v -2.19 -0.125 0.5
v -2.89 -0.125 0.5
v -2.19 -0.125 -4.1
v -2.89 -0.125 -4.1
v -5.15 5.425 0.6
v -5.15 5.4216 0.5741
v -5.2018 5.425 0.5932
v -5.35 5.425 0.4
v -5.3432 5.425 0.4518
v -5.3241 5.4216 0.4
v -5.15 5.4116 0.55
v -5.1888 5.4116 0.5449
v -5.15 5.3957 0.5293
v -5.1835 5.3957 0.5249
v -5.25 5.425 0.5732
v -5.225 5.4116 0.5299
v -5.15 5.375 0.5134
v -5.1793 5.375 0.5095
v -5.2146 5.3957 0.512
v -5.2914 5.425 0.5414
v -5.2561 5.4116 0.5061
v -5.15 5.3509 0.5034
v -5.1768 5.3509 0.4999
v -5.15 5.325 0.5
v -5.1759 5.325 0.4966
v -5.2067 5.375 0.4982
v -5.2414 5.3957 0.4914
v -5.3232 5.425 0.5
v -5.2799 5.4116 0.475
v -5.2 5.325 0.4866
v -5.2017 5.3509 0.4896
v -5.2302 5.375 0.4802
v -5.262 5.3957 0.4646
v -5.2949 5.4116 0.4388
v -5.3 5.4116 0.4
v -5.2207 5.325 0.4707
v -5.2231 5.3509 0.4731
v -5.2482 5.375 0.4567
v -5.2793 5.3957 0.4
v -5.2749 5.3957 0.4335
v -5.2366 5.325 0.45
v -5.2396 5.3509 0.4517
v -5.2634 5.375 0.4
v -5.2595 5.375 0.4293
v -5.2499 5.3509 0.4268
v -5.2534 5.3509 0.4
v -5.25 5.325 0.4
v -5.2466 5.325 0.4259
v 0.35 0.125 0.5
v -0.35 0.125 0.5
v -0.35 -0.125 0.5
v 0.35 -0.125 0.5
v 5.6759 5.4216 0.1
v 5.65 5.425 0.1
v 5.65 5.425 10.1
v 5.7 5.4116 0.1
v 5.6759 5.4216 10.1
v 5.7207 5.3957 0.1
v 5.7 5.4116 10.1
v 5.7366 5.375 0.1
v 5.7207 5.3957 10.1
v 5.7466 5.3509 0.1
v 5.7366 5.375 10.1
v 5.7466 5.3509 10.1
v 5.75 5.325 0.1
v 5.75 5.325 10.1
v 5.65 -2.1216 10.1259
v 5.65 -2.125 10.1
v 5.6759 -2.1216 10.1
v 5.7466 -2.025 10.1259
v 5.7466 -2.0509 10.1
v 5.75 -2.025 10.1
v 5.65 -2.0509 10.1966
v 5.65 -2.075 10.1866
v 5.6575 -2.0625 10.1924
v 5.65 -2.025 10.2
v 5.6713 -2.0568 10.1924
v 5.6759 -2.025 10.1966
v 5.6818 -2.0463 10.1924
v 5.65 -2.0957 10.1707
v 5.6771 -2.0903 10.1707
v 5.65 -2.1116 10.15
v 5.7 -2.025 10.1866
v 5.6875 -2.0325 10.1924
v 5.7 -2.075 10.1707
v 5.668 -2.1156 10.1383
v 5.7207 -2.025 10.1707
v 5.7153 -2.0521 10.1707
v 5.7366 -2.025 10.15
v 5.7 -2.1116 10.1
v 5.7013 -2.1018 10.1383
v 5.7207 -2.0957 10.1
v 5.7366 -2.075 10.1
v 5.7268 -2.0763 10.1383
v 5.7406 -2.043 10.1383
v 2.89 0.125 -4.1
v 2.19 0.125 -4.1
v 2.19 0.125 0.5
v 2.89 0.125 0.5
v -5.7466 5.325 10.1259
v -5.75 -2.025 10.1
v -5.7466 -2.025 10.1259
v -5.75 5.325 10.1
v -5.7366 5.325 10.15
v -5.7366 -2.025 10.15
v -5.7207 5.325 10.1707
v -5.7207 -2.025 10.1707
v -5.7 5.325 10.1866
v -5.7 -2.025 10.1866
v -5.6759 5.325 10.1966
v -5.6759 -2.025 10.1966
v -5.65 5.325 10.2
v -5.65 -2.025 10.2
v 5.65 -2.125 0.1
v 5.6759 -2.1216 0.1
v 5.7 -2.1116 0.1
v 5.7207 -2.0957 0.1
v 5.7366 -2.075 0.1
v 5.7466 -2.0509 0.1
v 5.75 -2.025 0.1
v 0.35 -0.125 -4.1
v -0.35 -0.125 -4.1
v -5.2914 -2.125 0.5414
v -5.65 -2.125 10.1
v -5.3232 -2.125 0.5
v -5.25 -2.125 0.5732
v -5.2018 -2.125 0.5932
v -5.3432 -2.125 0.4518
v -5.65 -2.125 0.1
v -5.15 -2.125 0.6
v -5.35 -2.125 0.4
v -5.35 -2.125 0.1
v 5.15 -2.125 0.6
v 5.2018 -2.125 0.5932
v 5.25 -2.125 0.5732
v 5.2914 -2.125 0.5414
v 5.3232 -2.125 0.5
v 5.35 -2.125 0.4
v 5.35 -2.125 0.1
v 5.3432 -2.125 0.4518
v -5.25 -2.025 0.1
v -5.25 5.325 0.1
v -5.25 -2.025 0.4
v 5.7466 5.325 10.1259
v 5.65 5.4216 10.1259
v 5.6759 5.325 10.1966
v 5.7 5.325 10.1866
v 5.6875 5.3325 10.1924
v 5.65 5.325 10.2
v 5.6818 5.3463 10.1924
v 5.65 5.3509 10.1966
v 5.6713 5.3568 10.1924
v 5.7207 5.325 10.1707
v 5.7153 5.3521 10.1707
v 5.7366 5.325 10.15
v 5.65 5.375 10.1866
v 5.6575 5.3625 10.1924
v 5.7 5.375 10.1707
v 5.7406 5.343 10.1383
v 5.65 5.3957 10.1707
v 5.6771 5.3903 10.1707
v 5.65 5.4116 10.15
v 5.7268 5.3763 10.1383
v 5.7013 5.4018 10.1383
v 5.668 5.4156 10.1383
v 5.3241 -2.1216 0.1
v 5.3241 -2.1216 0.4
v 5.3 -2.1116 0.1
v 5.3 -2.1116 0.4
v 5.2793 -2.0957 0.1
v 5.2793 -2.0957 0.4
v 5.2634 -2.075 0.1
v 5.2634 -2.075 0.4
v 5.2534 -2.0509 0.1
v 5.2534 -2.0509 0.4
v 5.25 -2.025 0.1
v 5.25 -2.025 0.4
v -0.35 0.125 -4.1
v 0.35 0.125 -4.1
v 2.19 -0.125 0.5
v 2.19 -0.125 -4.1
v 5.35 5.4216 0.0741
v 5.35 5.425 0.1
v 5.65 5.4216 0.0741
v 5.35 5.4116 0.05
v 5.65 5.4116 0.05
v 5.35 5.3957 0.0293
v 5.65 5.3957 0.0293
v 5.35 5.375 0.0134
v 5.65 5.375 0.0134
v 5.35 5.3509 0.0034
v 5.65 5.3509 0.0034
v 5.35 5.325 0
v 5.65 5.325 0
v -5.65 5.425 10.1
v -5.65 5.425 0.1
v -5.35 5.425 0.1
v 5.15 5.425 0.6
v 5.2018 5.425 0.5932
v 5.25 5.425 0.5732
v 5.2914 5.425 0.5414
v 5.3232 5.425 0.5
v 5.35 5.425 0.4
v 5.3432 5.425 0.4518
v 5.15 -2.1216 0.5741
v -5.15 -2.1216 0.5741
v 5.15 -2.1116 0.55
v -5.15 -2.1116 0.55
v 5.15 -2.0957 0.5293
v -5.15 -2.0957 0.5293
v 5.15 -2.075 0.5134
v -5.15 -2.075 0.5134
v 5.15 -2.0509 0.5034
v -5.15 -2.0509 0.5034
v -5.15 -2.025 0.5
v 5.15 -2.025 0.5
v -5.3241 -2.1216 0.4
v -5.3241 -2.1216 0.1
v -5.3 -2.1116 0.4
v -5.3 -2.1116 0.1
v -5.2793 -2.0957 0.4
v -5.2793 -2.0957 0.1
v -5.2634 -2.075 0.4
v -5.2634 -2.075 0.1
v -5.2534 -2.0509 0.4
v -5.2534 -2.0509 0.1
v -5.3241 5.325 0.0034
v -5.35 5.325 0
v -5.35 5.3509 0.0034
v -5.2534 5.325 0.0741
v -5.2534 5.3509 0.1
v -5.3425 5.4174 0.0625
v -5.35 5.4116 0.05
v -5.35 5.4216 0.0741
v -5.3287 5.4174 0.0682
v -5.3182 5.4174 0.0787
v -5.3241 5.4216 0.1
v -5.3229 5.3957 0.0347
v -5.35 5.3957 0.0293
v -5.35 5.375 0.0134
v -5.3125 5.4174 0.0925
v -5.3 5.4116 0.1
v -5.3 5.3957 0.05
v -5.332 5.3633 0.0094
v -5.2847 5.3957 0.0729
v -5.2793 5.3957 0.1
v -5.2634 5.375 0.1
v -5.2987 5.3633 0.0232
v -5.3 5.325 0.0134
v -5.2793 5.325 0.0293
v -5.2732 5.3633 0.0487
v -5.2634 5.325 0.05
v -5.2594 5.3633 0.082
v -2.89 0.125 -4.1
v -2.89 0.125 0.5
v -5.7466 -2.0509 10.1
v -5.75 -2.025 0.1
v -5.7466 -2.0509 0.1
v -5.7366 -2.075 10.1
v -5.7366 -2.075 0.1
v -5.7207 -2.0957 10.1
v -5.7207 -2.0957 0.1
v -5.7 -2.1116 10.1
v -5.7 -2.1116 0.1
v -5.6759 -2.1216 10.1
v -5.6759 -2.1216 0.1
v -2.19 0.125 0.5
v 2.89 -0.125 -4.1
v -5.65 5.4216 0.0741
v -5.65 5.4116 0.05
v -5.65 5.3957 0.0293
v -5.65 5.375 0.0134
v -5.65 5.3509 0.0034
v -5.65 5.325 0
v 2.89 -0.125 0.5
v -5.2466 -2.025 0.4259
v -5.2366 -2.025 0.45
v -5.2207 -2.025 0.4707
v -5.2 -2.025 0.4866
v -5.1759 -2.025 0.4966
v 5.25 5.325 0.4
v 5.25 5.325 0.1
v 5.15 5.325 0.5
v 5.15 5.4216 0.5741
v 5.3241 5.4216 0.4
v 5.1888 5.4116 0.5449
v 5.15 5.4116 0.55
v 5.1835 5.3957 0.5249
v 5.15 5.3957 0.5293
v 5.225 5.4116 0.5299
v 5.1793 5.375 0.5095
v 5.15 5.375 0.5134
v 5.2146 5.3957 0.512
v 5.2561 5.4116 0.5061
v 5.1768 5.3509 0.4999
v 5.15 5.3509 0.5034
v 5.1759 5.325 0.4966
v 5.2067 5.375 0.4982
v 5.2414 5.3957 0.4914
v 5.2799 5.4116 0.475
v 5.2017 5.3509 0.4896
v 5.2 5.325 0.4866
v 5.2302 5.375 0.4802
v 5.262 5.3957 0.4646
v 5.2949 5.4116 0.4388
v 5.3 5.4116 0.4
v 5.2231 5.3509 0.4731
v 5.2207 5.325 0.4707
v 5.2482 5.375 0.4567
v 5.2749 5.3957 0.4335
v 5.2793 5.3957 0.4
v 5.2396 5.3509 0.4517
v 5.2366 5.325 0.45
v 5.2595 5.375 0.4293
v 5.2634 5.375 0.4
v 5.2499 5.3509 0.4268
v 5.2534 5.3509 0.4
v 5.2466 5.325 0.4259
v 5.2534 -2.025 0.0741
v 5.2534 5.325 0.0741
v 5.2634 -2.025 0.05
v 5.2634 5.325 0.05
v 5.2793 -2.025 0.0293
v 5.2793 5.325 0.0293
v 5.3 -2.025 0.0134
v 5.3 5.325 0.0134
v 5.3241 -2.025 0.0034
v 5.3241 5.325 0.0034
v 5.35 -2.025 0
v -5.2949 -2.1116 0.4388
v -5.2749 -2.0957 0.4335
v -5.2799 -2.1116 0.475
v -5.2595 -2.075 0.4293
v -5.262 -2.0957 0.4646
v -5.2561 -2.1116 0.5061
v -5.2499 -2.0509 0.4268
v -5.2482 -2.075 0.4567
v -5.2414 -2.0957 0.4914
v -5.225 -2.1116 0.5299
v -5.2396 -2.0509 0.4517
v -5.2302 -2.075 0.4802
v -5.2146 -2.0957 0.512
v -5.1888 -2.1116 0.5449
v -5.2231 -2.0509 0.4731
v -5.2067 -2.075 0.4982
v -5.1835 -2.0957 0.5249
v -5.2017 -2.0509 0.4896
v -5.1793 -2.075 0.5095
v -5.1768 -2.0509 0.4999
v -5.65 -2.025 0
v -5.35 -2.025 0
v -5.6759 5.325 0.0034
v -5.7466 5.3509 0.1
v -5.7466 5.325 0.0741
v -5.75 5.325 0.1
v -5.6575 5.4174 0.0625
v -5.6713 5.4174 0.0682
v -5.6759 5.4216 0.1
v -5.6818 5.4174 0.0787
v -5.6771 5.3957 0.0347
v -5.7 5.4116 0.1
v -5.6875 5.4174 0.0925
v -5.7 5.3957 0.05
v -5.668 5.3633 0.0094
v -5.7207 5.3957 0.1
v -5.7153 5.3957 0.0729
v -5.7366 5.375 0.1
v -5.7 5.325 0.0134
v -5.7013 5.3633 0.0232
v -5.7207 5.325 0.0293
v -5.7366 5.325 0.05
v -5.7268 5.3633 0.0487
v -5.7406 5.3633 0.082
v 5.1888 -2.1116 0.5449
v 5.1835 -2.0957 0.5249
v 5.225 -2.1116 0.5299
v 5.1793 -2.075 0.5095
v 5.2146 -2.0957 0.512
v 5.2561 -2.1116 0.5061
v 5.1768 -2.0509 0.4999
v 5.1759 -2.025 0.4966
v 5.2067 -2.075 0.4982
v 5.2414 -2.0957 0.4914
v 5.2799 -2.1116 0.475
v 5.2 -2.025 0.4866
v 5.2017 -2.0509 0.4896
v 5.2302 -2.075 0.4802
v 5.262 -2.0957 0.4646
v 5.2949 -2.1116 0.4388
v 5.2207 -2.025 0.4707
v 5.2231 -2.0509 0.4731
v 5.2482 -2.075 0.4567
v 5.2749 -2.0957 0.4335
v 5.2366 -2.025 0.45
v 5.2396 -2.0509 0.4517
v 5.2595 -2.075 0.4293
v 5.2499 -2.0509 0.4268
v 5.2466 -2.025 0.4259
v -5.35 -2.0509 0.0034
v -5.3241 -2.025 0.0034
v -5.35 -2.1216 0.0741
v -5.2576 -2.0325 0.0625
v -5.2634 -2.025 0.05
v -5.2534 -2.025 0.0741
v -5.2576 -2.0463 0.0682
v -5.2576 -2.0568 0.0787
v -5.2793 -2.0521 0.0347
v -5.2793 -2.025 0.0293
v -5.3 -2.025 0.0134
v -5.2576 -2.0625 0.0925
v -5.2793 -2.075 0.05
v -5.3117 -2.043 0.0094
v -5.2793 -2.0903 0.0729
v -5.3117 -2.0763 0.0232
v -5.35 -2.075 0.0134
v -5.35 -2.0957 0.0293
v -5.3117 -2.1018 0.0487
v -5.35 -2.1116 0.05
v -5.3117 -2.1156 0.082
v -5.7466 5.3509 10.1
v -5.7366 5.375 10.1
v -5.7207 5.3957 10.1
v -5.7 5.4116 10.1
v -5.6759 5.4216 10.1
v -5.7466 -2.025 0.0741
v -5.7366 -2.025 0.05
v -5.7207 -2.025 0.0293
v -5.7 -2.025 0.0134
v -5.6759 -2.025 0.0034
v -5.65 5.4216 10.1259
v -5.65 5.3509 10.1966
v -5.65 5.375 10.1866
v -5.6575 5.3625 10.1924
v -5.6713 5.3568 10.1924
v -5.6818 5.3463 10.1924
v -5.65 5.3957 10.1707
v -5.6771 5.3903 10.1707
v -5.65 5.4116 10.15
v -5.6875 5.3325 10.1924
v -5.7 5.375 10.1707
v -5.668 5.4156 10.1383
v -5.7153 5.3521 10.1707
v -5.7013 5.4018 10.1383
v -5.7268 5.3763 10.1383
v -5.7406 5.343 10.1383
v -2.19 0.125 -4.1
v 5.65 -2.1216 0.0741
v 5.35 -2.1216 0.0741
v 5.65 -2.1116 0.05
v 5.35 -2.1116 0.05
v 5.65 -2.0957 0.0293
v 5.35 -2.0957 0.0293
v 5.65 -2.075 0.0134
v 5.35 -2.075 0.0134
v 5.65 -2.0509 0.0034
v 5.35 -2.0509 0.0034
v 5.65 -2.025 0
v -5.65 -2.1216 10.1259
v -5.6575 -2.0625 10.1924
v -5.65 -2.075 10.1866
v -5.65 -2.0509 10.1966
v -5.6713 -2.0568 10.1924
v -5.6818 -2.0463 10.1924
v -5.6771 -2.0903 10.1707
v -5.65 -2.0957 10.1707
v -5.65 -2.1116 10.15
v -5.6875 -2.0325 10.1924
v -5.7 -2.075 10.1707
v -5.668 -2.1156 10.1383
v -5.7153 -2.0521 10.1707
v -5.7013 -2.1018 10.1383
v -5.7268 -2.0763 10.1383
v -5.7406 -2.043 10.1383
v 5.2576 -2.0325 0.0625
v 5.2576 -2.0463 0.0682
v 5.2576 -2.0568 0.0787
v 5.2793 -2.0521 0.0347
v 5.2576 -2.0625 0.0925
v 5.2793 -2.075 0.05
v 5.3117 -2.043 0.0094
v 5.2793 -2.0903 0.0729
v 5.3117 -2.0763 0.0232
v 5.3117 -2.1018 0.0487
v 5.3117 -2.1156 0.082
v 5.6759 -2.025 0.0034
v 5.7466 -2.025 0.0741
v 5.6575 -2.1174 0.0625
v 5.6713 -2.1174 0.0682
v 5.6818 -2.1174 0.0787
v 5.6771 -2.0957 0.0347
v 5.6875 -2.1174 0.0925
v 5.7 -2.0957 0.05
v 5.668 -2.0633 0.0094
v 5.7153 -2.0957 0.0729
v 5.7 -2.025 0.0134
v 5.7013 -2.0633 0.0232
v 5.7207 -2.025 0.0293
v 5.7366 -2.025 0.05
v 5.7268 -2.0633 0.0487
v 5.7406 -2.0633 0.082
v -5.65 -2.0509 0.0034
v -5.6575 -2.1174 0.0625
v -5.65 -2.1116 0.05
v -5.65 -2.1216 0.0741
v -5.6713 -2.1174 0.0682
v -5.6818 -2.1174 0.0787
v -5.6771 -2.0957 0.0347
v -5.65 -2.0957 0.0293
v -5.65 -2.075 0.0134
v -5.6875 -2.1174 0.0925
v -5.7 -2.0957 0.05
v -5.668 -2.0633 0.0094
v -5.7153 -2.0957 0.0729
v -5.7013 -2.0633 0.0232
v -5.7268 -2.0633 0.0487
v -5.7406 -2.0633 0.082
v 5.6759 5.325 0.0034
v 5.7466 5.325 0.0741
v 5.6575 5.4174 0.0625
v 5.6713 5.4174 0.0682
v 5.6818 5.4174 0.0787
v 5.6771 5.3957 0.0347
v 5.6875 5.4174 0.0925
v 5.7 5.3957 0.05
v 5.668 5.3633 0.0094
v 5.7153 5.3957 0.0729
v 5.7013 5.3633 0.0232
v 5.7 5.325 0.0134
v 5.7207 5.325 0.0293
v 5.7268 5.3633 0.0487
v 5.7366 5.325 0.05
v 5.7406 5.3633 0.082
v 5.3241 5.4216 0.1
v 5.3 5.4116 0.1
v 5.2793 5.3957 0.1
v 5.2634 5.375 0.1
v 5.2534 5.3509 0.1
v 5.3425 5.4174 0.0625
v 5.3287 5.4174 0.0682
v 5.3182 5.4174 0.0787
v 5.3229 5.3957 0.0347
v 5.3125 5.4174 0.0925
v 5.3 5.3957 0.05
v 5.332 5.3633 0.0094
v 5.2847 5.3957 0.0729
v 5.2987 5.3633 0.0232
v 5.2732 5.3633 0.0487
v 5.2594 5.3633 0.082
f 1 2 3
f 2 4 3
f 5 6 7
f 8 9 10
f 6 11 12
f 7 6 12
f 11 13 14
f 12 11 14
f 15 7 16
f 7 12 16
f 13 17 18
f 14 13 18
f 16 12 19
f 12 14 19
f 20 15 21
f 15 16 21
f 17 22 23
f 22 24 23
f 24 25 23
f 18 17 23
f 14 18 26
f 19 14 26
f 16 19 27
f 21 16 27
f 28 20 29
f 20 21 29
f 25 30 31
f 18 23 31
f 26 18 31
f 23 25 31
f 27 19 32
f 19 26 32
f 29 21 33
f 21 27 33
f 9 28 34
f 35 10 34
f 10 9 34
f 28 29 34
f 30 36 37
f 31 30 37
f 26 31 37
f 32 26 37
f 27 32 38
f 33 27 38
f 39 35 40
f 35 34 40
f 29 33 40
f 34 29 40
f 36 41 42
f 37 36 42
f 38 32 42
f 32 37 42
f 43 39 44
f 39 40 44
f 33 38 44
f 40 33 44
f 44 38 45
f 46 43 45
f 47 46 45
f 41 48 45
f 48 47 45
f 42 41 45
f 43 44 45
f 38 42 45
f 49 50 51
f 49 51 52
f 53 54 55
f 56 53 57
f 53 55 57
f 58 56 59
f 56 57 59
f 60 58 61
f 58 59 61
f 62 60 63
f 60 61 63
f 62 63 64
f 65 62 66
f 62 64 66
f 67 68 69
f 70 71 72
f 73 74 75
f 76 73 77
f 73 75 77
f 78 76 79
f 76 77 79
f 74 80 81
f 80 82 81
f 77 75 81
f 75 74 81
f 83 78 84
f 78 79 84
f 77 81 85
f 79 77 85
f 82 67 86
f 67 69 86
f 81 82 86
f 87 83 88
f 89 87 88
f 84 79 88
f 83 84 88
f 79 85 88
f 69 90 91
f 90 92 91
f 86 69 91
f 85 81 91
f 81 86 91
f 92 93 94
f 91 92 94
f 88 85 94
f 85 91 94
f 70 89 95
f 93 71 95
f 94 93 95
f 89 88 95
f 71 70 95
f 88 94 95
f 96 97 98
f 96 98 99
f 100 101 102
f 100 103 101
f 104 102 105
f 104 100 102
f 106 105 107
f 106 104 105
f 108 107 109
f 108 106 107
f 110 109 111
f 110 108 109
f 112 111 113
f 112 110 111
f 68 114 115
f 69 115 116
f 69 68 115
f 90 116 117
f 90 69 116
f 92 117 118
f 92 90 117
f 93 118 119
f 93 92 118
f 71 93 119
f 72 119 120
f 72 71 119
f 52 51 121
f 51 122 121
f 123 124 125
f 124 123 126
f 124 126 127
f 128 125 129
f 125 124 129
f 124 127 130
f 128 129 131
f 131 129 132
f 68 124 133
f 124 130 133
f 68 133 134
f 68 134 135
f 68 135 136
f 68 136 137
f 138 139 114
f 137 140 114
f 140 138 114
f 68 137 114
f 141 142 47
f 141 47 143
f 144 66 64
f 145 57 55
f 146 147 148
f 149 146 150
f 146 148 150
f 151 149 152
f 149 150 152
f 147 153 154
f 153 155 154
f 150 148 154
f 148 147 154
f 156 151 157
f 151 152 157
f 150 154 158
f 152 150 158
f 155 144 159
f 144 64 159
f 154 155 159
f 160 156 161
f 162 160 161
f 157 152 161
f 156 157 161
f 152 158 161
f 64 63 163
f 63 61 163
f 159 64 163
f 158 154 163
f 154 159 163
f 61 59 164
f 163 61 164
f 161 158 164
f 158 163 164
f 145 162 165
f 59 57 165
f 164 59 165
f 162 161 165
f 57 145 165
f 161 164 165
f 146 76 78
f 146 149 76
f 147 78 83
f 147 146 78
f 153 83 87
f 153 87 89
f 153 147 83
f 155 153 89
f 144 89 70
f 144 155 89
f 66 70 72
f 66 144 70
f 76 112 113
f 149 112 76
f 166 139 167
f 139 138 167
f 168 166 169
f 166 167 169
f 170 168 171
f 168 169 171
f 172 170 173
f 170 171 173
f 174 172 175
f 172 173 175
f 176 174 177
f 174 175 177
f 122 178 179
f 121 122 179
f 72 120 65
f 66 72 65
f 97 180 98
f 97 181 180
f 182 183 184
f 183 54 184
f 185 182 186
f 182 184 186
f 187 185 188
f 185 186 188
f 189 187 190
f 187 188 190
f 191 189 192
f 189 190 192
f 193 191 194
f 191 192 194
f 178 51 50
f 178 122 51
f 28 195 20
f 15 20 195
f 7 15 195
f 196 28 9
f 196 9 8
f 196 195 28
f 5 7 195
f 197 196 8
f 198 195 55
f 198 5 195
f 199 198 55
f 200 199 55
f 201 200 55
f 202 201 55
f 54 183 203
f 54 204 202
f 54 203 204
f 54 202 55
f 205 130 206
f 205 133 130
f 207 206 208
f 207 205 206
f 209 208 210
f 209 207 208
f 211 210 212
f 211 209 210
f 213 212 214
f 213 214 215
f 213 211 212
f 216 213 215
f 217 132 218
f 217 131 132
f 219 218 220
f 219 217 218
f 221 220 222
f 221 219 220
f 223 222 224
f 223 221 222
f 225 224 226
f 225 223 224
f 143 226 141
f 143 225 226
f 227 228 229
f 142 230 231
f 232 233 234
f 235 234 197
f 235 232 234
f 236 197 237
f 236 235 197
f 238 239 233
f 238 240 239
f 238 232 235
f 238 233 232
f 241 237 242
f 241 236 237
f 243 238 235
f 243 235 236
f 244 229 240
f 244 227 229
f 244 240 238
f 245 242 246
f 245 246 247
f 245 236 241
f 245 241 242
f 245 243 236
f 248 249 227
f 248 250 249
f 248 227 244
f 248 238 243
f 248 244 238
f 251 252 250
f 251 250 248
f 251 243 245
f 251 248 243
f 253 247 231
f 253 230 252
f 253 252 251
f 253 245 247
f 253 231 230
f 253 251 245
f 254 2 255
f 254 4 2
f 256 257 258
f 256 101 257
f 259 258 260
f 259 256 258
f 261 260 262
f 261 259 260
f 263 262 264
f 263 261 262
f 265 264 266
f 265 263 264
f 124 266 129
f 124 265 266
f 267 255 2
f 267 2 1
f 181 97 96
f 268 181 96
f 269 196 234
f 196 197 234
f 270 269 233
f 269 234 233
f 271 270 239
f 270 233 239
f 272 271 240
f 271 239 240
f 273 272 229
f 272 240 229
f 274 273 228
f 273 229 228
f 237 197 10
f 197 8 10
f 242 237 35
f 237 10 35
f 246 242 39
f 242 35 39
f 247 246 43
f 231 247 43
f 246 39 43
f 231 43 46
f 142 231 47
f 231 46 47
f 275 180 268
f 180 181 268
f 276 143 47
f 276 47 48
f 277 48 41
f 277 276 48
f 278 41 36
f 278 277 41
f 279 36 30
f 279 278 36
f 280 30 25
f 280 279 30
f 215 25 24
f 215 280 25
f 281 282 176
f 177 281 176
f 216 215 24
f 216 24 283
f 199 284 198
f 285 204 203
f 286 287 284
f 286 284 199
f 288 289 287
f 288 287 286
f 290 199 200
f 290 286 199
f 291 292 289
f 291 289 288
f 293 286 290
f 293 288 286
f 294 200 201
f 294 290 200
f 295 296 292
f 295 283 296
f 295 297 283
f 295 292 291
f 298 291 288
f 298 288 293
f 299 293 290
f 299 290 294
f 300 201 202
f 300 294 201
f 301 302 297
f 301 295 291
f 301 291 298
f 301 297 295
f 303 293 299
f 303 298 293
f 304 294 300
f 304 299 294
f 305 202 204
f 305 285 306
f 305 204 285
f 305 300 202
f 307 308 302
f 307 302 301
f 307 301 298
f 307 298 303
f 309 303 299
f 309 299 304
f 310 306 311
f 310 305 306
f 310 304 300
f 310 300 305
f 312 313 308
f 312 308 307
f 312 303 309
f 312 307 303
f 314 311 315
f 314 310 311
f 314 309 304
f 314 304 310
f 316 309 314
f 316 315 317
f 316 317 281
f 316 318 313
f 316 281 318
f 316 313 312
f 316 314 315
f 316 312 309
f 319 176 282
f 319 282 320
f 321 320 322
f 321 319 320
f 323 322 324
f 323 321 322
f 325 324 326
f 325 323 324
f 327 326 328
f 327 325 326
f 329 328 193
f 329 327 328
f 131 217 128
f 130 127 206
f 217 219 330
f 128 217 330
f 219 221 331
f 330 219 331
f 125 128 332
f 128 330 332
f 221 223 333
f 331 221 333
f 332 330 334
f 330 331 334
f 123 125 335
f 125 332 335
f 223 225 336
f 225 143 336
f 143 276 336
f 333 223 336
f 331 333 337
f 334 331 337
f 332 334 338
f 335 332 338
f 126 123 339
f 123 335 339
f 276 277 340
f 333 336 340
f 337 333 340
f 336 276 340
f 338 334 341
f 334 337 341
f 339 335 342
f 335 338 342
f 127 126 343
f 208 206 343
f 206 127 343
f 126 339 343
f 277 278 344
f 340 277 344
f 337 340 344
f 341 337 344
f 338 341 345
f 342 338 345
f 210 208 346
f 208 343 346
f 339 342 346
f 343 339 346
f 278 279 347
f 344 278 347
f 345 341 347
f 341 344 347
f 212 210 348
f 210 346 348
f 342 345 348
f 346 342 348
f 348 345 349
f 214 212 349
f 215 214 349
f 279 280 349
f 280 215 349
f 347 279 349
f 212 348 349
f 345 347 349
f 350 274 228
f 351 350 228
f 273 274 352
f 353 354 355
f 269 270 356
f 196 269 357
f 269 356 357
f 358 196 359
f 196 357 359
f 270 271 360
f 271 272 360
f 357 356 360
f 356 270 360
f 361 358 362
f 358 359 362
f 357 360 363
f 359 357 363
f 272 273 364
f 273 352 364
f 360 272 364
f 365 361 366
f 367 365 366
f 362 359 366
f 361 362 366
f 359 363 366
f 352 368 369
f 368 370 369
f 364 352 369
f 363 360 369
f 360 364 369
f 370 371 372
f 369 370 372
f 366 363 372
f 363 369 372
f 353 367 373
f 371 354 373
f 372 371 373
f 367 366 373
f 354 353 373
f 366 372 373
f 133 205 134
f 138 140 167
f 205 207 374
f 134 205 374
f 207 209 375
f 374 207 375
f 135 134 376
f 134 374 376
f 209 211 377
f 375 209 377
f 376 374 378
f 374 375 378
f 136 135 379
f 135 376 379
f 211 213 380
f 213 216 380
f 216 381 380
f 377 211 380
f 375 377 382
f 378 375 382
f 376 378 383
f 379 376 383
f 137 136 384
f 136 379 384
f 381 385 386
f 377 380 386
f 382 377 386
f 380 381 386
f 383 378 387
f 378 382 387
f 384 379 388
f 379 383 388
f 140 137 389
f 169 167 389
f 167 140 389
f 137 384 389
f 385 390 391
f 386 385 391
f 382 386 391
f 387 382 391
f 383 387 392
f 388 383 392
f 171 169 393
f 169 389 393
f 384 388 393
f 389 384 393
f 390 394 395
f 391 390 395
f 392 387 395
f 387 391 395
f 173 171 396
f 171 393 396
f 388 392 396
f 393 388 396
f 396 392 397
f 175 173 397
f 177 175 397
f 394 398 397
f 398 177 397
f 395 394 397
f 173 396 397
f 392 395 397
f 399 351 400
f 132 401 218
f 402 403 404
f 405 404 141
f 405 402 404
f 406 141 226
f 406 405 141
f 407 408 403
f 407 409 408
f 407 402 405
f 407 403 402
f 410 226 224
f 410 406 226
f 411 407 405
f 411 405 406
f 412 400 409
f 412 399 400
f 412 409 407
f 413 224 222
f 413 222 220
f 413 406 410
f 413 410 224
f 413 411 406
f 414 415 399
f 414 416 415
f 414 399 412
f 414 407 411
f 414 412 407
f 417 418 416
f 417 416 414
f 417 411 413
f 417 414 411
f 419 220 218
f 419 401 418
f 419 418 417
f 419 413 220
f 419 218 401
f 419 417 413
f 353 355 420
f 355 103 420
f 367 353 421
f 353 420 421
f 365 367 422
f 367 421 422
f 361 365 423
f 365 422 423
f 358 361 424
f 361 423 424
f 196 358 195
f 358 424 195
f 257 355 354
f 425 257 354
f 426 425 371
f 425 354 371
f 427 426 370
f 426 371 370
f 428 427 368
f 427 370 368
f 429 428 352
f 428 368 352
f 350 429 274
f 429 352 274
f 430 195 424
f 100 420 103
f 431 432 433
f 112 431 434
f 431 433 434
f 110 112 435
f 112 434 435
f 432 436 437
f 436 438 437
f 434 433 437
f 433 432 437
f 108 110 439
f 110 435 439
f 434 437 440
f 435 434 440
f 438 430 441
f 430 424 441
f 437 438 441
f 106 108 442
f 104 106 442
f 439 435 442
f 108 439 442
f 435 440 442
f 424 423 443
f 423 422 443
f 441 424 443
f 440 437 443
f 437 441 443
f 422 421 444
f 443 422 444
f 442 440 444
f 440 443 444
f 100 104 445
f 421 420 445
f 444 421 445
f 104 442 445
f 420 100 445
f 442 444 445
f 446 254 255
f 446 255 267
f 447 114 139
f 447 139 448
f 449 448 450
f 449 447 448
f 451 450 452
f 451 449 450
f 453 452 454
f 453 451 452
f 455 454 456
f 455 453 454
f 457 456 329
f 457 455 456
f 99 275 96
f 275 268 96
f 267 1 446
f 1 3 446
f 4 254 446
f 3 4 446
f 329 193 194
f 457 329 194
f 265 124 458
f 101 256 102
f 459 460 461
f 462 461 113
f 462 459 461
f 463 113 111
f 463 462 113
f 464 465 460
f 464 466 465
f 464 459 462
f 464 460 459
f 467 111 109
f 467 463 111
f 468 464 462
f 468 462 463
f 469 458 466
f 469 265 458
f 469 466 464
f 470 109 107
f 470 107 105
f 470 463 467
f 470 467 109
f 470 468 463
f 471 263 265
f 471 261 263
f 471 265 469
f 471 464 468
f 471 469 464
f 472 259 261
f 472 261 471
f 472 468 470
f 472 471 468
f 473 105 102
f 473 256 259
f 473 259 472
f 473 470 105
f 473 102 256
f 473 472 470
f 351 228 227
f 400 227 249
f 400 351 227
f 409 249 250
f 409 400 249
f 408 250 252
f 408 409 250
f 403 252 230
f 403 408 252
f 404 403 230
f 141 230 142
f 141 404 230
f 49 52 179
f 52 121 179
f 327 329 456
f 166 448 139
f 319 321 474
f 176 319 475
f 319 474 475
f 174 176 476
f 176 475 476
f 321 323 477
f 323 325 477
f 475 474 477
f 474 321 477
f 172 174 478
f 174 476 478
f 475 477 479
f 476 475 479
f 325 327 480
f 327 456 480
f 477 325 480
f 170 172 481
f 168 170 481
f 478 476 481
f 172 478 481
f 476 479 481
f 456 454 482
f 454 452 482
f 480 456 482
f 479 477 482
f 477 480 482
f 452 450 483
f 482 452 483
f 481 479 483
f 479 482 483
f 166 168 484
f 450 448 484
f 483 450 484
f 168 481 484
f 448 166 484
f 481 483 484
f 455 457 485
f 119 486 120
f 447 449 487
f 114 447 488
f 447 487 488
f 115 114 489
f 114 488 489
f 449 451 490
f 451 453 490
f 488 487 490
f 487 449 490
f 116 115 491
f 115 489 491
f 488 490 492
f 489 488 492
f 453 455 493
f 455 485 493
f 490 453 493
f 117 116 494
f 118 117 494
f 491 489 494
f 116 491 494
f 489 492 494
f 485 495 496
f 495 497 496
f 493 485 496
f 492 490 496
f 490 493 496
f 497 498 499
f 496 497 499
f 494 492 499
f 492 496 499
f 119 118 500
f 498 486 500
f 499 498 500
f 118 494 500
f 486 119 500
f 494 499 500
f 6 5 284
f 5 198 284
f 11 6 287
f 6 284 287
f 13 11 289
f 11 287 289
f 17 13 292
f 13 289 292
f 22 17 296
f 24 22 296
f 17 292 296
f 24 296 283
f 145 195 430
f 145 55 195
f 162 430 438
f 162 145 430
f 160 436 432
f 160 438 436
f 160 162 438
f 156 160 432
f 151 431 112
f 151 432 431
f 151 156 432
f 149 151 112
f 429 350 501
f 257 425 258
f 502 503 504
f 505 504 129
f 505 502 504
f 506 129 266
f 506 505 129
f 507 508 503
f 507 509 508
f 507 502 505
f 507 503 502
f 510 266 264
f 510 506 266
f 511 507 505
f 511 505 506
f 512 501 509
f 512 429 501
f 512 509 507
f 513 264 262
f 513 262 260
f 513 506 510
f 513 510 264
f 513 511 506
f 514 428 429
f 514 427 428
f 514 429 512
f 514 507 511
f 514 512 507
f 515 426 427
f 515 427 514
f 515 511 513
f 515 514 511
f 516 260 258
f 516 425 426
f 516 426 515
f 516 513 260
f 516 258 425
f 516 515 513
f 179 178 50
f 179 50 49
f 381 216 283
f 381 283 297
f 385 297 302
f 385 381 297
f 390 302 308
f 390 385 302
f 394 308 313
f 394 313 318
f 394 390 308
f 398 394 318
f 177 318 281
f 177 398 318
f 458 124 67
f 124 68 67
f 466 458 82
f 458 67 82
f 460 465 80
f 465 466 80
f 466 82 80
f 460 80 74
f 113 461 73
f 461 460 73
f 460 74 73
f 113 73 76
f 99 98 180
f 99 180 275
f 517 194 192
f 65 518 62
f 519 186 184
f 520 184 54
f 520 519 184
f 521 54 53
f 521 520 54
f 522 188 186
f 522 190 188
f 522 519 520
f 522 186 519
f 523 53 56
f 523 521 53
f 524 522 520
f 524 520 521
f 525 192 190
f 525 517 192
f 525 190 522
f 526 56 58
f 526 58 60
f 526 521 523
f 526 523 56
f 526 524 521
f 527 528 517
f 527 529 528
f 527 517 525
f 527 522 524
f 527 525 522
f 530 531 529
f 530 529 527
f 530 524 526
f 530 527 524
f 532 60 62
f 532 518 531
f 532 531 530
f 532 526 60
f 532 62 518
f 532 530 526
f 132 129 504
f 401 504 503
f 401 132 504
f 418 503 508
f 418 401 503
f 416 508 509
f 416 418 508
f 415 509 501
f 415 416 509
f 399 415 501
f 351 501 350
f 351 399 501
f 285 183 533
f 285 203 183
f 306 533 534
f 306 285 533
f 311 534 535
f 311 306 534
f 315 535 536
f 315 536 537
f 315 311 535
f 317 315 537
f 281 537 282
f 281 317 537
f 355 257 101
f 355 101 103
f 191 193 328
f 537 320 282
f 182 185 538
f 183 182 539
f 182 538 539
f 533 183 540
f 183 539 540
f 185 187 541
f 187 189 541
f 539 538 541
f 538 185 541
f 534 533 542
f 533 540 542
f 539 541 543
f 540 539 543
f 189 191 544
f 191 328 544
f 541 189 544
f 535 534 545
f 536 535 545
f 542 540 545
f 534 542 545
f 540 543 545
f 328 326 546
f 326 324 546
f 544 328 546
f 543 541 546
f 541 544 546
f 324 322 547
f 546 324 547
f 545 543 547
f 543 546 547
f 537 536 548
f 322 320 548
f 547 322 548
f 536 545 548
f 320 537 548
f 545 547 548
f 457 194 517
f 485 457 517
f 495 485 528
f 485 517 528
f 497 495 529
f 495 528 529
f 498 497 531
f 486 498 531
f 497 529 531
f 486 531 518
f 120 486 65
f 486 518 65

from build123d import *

# Parameters (mm, degrees)
F0_W          = 11.5
F0_H          = 7.55
F1_DEPTH      = 10.2
F2_W          = 10.5
F2_H          = 7.55
F3_DEPTH      = 0.5
F4_R          = 0.1
F5_W          = 0.7
F5_H          = 0.25
F6_DEPTH      = 4.1
F6_DEPTH_BACK = 0.5


with BuildPart() as f1:
    # F0 (on Top) → F1 (new body)
    with BuildSketch(Plane.XY):
        with Locations((0, 1.65)):
            Rectangle(F0_W, F0_H)
    extrude(amount=F1_DEPTH)

    # F2 (on face) → F3 (cut)
    with BuildSketch(Plane(origin=(0, 0, 0), x_dir=(1, 0, 0), z_dir=(0, 0, -1))):
        with Locations((0, -1.65)):
            Rectangle(F2_W, F2_H)
    extrude(amount=-F3_DEPTH, mode=Mode.SUBTRACT)

    # F4
    f4_edges = [f1.edges().sort_by_distance(p)[0] for p in [
        (-5.75, 1.65, 0),
        (-5.5, -2.125, 0),
        (-5.25, 1.65, 0),
        (-5.5, 5.425, 0),
        (-5.25, 5.425, 0.25),
        (-5.25, 1.65, 0.5),
        (-5.25, -2.125, 0.25),
        (0, -2.125, 0.5),
        (0, 5.425, 0.5),
        (5.75, 1.65, 0),
        (5.5, -2.125, 0),
        (5.25, 1.65, 0),
        (5.5, 5.425, 0),
        (5.75, 5.425, 5.1),
        (5.25, 5.425, 0.25),
        (5.75, -2.125, 5.1),
        (5.25, -2.125, 0.25),
        (5.25, 1.65, 0.5),
        (-5.75, -2.125, 5.1),
        (-5.75, 5.425, 5.1),
        (0, -2.125, 10.2),
        (5.75, 1.65, 10.2),
        (0, 5.425, 10.2),
        (-5.75, 1.65, 10.2),
    ]]
    fillet(f4_edges, radius=F4_R)


with BuildPart() as f6:
    # F5 (on Top) → F6 (new body, two sides)
    with BuildSketch(Plane.XY) as f6_sk:
        with Locations((2.54, 0)):
            Rectangle(F5_W, F5_H)
    extrude(amount=-F6_DEPTH)
    extrude(f6_sk.sketch, amount=F6_DEPTH_BACK)


with BuildPart() as f6b:
    # F5 (on Top) → F6, piece 2 (new body, two sides)
    with BuildSketch(Plane.XY) as f6_2_sk:
        Rectangle(F5_W, F5_H)
    extrude(amount=-F6_DEPTH)
    extrude(f6_2_sk.sketch, amount=F6_DEPTH_BACK)


with BuildPart() as f6c:
    # F5 (on Top) → F6, piece 3 (new body, two sides)
    with BuildSketch(Plane.XY) as f6_3_sk:
        with Locations((-2.54, 0)):
            Rectangle(F5_W, F5_H)
    extrude(amount=-F6_DEPTH)
    extrude(f6_3_sk.sketch, amount=F6_DEPTH_BACK)


solid = Compound([f1.part, f6.part, f6b.part, f6c.part])
